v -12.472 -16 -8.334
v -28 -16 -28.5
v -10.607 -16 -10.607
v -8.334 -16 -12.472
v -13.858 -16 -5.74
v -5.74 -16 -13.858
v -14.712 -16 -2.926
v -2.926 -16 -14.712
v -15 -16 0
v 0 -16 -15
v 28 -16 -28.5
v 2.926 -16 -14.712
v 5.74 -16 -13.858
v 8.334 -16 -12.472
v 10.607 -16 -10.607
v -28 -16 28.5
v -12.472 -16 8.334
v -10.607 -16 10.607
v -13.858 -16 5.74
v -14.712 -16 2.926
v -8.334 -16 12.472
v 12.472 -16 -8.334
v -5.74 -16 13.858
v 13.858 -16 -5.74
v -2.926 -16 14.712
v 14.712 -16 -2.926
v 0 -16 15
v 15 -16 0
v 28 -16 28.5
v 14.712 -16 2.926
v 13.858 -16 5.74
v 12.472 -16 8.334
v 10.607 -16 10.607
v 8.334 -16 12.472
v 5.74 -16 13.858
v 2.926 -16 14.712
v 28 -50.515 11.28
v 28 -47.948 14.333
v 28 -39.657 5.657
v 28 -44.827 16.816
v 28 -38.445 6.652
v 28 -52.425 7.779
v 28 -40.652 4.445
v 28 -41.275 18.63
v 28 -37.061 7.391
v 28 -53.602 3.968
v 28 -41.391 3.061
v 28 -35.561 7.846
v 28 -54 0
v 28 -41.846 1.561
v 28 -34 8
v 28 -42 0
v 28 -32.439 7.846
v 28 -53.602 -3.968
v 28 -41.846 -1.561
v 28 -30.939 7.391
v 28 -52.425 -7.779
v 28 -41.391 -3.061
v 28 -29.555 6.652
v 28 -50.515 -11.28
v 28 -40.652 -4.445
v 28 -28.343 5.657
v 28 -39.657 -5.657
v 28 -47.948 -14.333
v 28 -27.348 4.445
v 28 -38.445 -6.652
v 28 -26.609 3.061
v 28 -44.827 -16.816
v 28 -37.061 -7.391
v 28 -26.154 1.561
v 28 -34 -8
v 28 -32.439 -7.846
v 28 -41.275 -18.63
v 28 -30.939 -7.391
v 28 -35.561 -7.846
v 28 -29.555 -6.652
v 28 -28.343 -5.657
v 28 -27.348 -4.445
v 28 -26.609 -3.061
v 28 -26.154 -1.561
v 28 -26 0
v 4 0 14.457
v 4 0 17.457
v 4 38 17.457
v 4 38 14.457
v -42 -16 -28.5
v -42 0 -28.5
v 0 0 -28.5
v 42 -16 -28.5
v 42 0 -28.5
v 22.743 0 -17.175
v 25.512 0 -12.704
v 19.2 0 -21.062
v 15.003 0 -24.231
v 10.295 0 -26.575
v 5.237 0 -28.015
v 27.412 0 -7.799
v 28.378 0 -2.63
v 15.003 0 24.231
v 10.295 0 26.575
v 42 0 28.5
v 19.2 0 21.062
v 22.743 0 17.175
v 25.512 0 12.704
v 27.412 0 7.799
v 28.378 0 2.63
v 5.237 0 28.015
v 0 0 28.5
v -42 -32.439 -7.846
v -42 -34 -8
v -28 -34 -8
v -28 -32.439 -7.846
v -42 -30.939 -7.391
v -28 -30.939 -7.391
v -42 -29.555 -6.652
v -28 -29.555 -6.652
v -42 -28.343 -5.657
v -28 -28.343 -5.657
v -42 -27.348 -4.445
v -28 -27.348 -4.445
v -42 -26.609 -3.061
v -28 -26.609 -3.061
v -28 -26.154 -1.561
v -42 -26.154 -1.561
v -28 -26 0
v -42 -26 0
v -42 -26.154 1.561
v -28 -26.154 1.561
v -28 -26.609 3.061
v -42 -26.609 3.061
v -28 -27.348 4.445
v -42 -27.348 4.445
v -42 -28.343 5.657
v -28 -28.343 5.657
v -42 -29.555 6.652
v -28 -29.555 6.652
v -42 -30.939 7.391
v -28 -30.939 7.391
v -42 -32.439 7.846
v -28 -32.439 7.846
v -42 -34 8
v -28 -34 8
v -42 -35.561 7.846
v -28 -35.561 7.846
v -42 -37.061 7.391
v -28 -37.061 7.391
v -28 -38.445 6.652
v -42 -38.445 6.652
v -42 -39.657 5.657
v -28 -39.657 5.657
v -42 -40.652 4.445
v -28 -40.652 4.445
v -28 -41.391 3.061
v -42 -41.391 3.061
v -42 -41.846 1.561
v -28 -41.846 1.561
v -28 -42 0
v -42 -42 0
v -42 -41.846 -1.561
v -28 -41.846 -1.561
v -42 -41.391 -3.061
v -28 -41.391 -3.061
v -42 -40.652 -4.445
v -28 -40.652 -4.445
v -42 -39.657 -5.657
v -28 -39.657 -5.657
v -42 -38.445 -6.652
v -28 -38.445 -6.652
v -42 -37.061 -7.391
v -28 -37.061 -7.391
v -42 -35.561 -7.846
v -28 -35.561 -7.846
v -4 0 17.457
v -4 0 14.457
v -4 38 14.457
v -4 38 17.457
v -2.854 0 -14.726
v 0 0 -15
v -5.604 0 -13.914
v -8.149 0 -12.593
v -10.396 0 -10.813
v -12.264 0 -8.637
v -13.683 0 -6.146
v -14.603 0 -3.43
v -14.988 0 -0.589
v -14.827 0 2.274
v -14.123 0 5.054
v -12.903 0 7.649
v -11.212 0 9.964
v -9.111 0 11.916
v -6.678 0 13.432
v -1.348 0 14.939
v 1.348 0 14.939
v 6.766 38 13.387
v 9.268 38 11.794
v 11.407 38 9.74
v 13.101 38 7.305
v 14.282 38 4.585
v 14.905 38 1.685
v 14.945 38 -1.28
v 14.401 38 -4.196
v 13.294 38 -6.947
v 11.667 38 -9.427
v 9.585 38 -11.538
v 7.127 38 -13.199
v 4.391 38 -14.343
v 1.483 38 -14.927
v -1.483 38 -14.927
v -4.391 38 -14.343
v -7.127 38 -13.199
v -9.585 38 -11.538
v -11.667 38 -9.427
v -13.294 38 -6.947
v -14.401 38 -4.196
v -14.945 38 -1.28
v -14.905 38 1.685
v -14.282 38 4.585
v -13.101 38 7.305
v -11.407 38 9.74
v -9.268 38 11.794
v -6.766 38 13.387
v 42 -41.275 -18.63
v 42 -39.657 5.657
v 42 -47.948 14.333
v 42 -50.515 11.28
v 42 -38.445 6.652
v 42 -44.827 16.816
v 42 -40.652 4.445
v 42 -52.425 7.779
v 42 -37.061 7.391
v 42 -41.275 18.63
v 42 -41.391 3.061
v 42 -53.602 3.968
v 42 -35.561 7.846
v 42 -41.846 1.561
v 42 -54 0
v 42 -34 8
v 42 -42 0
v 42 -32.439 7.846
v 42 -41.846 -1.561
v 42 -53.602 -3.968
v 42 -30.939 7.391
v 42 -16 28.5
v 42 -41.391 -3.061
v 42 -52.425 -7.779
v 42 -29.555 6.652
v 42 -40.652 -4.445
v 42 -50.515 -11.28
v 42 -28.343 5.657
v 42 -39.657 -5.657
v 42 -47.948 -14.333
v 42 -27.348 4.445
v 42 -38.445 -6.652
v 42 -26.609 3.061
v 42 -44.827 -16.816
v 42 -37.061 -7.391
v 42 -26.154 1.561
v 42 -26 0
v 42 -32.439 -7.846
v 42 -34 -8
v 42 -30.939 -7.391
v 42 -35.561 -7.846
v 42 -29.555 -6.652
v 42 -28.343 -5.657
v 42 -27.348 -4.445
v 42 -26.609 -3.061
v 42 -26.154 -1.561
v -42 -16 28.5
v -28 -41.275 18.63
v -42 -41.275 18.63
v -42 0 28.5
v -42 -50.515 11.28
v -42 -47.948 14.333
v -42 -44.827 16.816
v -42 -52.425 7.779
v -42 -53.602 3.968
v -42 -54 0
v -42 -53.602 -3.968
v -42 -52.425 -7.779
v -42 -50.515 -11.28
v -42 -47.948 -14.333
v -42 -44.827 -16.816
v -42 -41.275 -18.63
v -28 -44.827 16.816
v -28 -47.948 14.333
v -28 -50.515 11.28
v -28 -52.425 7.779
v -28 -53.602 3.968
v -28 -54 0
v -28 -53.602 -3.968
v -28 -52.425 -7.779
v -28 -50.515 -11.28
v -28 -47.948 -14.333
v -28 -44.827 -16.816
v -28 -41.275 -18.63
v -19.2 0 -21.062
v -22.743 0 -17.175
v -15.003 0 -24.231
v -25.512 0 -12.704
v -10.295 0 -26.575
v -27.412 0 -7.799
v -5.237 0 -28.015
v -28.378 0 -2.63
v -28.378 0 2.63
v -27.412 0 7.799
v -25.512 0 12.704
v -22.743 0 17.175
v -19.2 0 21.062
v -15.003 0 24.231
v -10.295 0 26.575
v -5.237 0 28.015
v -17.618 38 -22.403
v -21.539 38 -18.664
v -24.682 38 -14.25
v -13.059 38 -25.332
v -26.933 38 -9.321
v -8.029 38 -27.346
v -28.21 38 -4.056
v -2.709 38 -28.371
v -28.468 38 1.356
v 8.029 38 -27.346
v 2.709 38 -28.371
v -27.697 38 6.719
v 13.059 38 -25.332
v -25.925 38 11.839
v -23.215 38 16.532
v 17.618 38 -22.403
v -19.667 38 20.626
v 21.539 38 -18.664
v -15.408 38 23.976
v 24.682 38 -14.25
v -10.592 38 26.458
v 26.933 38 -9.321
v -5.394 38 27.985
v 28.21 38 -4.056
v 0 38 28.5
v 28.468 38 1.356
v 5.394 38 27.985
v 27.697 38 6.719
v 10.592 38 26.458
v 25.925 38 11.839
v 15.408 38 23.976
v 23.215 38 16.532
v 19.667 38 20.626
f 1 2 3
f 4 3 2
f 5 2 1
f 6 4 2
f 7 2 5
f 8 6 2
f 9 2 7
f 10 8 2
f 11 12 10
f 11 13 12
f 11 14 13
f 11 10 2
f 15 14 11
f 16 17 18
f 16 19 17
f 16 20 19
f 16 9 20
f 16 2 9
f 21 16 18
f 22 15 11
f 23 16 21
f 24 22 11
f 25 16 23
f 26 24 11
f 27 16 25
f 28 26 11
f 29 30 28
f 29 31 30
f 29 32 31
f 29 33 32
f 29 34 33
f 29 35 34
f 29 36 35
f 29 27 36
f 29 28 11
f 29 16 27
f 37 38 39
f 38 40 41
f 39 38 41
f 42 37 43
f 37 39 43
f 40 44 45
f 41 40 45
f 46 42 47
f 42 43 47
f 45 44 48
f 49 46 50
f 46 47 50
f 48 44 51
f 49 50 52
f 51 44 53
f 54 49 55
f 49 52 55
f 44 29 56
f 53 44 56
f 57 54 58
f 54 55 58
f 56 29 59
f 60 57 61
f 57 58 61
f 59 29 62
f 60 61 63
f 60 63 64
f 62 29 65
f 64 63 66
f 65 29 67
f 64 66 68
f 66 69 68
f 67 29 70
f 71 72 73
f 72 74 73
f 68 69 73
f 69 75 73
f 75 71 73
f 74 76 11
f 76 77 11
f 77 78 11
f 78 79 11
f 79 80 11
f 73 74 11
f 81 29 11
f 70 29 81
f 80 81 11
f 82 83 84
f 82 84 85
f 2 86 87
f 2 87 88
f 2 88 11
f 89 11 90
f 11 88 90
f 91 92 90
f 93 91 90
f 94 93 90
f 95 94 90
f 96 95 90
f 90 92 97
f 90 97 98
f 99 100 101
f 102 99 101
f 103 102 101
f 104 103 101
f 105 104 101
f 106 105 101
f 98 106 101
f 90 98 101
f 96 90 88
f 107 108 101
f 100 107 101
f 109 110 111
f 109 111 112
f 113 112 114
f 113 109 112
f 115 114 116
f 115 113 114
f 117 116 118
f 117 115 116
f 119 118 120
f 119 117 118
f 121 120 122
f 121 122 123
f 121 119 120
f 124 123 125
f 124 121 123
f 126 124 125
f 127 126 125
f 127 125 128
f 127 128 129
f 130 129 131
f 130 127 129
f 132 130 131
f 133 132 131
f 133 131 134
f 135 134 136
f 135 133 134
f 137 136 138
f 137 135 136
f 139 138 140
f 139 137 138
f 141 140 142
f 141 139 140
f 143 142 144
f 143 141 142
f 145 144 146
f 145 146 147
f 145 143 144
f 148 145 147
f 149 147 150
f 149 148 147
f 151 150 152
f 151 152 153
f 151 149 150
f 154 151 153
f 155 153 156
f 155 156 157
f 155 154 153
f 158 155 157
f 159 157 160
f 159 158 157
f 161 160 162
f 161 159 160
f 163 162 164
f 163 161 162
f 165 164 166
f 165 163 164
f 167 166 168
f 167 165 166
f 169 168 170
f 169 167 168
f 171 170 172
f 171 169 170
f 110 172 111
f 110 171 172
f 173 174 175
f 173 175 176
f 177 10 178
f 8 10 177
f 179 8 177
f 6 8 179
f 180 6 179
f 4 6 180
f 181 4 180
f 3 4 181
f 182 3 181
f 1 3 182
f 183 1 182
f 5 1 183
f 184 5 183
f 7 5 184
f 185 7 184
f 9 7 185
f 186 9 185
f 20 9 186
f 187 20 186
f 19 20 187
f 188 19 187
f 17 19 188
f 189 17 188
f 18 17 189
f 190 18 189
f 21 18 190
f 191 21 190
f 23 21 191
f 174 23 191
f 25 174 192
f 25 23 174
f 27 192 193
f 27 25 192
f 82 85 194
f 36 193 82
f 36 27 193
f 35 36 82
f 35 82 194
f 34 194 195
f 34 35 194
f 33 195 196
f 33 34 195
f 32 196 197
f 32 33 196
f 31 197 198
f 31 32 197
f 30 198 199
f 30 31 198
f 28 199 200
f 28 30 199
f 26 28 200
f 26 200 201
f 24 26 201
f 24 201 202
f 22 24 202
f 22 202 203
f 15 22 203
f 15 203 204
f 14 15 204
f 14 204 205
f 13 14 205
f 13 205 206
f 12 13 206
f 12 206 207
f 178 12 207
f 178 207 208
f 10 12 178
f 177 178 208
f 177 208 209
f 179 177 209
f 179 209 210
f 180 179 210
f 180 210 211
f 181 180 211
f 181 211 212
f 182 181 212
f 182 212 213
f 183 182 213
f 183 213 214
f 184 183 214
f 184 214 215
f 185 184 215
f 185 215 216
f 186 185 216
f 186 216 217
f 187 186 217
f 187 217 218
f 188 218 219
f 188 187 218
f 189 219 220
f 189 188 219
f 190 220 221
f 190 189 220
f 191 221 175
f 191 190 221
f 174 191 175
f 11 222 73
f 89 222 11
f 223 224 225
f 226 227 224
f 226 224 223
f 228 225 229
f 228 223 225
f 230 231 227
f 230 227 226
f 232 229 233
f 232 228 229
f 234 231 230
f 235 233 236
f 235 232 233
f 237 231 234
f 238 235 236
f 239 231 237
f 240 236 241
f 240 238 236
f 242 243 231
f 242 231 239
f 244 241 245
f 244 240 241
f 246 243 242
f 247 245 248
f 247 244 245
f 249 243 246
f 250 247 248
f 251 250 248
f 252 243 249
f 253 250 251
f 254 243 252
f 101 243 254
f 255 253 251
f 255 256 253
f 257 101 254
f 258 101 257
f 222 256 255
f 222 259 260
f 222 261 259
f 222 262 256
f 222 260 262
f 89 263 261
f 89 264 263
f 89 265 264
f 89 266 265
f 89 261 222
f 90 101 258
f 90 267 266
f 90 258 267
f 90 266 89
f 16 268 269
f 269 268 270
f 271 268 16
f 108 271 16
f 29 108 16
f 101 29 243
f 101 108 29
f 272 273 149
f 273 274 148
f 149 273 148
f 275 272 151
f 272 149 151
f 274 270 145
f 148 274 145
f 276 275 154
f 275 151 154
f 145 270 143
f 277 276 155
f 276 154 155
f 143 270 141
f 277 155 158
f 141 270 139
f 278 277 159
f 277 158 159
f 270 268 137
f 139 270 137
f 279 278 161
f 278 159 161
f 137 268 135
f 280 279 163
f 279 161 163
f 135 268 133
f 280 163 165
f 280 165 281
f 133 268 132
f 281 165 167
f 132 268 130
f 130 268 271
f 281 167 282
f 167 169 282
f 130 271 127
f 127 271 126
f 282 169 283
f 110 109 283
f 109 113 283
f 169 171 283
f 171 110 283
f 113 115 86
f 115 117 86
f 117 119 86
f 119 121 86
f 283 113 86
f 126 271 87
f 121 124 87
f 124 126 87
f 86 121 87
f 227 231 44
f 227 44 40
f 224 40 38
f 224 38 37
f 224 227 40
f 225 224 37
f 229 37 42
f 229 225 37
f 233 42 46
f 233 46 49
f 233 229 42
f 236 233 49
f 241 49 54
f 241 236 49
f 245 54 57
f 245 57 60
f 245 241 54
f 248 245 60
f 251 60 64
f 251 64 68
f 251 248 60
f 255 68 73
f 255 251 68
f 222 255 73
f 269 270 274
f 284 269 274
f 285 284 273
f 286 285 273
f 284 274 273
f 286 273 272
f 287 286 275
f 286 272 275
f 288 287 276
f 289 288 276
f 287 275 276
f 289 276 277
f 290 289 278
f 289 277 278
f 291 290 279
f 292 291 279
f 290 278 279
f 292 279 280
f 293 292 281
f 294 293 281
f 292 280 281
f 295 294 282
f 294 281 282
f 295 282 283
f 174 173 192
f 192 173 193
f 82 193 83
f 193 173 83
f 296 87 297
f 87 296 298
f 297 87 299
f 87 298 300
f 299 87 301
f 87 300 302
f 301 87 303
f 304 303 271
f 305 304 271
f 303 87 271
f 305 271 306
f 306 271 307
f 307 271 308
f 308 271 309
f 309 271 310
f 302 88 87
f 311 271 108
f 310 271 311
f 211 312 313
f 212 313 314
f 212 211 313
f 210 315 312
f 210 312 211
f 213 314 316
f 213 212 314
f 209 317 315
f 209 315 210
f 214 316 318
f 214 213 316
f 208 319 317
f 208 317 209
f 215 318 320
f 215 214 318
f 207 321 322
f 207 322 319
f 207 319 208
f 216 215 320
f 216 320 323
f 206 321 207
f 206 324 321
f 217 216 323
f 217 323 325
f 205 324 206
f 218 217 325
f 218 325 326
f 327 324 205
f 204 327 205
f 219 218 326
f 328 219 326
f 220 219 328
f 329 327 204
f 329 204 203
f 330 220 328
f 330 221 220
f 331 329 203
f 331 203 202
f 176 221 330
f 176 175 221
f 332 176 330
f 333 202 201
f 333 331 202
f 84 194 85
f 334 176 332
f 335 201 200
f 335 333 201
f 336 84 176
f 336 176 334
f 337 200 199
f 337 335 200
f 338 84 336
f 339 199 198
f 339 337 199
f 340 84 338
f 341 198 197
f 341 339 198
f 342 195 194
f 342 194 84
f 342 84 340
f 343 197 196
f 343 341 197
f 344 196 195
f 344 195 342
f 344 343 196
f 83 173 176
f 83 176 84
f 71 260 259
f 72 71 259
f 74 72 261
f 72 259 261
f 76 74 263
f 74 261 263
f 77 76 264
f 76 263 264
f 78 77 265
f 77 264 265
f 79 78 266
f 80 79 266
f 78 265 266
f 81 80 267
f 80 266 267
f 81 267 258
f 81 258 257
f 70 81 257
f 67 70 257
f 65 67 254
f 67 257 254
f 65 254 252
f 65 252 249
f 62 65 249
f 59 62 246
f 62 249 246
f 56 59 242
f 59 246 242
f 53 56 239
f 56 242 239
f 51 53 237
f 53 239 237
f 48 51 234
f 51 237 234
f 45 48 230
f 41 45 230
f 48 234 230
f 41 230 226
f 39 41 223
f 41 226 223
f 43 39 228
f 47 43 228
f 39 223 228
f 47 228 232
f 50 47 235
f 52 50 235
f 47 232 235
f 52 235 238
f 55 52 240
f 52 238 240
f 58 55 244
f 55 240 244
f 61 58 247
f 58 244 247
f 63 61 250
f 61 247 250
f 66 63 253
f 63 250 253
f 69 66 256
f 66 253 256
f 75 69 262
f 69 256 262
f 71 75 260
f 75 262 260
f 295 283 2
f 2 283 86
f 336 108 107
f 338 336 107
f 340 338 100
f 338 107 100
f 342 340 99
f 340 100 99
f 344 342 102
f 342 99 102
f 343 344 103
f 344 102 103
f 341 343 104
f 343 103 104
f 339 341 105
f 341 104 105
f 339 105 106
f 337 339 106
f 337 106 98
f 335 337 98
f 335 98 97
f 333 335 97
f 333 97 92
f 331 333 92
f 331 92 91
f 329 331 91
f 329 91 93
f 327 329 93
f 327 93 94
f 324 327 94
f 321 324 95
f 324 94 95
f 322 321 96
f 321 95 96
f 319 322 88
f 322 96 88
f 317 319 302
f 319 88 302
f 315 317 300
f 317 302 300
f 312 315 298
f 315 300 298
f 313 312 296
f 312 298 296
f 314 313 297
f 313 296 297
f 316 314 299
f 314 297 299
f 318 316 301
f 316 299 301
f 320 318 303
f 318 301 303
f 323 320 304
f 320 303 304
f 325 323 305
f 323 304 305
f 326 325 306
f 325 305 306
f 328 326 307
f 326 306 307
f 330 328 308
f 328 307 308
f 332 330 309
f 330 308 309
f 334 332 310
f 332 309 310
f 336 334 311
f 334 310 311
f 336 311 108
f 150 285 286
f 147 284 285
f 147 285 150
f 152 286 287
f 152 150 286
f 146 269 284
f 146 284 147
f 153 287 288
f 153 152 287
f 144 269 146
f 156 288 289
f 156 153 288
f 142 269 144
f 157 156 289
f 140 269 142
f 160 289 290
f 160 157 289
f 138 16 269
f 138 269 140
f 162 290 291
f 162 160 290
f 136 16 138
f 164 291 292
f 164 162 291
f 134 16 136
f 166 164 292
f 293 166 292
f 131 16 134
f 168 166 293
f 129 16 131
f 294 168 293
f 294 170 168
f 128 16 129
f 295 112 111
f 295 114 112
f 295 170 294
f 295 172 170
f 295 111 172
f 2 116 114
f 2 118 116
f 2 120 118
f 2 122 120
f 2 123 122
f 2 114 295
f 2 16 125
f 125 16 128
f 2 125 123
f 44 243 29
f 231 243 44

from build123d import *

# Parameters (mm, degrees)
SKETCH1_R           = 28.5
SKETCH1_R_2         = 15
BOSS_EXTRUDE1_DEPTH = 38
SKETCH2_W           = 84
SKETCH2_H           = 57
BOSS_EXTRUDE2_DEPTH = 16
SKETCH3_R           = 8
BOSS_EXTRUDE3_DEPTH = 14
CUT_EXTRUDE1_START  = -38
CUT_EXTRUDE1_DEPTH  = 38
CUT_EXTRUDE2_START  = -38
SKETCH5_R           = 15
CUT_EXTRUDE2_DEPTH  = 38


with BuildPart() as part:
    # Sketch1 → Boss-Extrude1 (new body)
    with BuildSketch(Plane(origin=(0, 0, 0), x_dir=(1, 0, 0), z_dir=(0, 1, 0))):
        with Locations(Location((0, 0, 0), (0, 0, 270))):
            Circle(SKETCH1_R)
        with Locations(Location((0, 0, 0), (0, 0, 270))):
            Circle(SKETCH1_R_2, mode=Mode.SUBTRACT)
    extrude(amount=BOSS_EXTRUDE1_DEPTH)

    # Sketch2 → Boss-Extrude2 (add)
    with BuildSketch(Plane.XZ):
        Rectangle(SKETCH2_W, SKETCH2_H)
    extrude(amount=BOSS_EXTRUDE2_DEPTH)

    # Sketch3 → Boss-Extrude3 (add)
    with BuildSketch(Plane(origin=(42, 0, 0), x_dir=(0, 0, -1), z_dir=(1, 0, 0))):
        with BuildLine():
            Line((-28.5, -16), (-18.629891095, -41.275105345))
            ThreePointArc((-18.629891095, -41.275105345), (0, -54), (18.629891095, -41.275105345))
            Line((18.629891095, -41.275105345), (28.5, -16))
            Line((28.5, -16), (-28.5, -16))
        make_face()
        with Locations((0, -34)):
            Circle(SKETCH3_R, mode=Mode.SUBTRACT)
    boss_extrude3 = extrude(amount=-BOSS_EXTRUDE3_DEPTH)

    # Mirror1: Boss-Extrude3 across plane
    add(boss_extrude3.mirror(Plane(origin=(0, 0, 0), x_dir=(0, 0, 1), z_dir=(1, 0, 0))))

    # Sketch4 → Cut-Extrude1 (cut)
    with BuildSketch(Plane(origin=(0, 38, 0), x_dir=(1, 0, 0), z_dir=(0, 1, 0)).offset(CUT_EXTRUDE1_START)):
        with BuildLine():
            Line((-4, -14.456832295), (-4, -17.456832295))
            Line((-4, -17.456832295), (4, -17.456832295))
            Line((4, -17.456832295), (4, -14.456832295))
            ThreePointArc((4, -14.456832295), (0, -15), (-4, -14.456832295))
        make_face()
    extrude(amount=CUT_EXTRUDE1_DEPTH, mode=Mode.SUBTRACT)

    # Sketch5 → Cut-Extrude2 (cut)
    with BuildSketch(Plane(origin=(0, 0, 0), x_dir=(1, 0, 0), z_dir=(0, 1, 0)).offset(CUT_EXTRUDE2_START)):
        with Locations(Location((0, 0, 0), (0, 0, 90))):
            Circle(SKETCH5_R)
    extrude(amount=CUT_EXTRUDE2_DEPTH, mode=Mode.SUBTRACT)


solid = part.part
